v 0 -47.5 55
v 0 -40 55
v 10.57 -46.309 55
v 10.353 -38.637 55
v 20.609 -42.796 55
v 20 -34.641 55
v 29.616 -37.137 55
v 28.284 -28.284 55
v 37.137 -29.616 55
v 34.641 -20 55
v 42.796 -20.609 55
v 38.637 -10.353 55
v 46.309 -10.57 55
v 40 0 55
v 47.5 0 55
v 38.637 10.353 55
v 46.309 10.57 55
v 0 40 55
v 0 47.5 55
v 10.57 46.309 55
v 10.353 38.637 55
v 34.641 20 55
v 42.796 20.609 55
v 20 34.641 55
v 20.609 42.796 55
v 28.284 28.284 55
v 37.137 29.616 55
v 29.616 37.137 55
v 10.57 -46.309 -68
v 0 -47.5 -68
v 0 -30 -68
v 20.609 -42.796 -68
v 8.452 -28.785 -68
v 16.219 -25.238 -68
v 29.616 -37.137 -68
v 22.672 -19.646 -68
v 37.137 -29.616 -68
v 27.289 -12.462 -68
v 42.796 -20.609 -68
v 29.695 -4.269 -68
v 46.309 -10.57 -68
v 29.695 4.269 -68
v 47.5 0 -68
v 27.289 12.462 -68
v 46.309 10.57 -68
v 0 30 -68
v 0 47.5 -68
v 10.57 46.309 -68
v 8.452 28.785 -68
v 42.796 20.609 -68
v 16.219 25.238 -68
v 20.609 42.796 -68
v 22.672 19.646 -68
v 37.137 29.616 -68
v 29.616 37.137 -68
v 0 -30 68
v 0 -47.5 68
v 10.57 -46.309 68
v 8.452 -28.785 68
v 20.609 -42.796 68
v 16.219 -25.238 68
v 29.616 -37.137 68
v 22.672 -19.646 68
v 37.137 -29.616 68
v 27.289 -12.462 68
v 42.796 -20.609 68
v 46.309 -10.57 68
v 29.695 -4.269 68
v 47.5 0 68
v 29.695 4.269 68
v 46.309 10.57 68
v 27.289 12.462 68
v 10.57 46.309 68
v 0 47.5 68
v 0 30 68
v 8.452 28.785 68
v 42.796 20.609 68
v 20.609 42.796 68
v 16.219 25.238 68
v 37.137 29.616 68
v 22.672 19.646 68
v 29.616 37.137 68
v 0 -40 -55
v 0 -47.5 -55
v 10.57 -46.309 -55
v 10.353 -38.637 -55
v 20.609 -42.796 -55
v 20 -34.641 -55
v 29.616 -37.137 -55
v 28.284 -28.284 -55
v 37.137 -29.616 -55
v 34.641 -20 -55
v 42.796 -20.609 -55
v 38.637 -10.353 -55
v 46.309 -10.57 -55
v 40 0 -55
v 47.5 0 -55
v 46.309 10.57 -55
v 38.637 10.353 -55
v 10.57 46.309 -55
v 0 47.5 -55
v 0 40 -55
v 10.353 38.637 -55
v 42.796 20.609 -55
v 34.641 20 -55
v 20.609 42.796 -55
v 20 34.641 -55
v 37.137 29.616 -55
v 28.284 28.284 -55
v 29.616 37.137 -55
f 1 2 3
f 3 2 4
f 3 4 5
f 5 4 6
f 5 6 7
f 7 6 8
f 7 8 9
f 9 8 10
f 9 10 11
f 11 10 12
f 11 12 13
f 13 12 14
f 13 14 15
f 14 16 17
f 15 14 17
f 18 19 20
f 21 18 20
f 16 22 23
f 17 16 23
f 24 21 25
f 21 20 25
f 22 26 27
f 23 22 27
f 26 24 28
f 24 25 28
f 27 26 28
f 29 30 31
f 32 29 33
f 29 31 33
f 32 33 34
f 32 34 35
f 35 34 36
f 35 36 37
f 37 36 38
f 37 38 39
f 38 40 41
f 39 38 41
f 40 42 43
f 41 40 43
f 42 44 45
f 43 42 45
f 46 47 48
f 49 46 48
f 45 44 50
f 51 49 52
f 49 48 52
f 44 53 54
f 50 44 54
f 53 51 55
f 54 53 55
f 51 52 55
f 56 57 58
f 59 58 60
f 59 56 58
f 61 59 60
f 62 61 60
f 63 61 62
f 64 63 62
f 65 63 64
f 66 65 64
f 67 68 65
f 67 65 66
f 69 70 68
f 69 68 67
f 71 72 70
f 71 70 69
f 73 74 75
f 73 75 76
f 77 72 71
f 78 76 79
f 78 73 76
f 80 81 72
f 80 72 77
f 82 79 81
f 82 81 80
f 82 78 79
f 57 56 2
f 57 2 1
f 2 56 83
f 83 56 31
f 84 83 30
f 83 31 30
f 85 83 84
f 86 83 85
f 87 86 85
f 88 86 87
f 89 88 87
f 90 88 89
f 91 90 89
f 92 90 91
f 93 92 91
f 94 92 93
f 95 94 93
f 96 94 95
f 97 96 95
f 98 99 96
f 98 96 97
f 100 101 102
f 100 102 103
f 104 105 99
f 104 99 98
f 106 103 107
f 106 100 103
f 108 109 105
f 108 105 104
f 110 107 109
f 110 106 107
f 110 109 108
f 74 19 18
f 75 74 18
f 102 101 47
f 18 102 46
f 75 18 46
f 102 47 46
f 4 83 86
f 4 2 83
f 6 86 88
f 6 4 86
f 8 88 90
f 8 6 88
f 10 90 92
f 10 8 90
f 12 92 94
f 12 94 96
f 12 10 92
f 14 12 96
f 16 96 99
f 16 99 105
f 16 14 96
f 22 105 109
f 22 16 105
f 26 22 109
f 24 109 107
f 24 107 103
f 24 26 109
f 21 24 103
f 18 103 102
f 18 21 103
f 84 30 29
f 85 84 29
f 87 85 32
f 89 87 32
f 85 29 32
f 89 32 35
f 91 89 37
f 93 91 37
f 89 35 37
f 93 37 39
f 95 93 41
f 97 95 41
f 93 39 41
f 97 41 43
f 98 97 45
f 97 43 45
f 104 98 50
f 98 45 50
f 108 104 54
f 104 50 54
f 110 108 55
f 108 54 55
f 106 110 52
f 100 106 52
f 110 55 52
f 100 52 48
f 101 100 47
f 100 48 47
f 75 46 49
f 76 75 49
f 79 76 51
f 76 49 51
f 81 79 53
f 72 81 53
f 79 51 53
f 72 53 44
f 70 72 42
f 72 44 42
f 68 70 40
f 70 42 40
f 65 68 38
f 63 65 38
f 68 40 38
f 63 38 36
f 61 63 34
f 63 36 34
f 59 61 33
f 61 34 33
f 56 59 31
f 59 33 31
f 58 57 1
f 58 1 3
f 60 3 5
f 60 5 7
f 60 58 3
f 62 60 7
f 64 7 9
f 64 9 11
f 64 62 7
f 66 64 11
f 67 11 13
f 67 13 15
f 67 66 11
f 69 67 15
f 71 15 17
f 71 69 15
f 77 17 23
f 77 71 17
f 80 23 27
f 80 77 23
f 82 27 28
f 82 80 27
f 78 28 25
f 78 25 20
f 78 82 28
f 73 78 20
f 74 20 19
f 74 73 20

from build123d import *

# Parameters (mm, degrees)
BOSS_EXTRUDE1_DEPTH = 55
BOSS_EXTRUDE2_START = 13
BOSS_EXTRUDE2_DEPTH = 13


with BuildPart() as part:
    # Sketch1 → Boss-Extrude1 (new, symmetric)
    with BuildSketch(Plane.XY):
        with BuildLine():
            Line((0, 40), (0, 30))
            ThreePointArc((0, 30), (30, 0), (0, -30))
            Line((0, -30), (0, -40))
            ThreePointArc((0, -40), (40, 0), (0, 40))
        make_face()
    extrude(amount=BOSS_EXTRUDE1_DEPTH, both=True)

    # Sketch2 → Boss-Extrude2 (add)
    with BuildSketch(Plane.XY.offset(55).offset(BOSS_EXTRUDE2_START)):
        with BuildLine():
            Line((0, 47.5), (0, 30))
            ThreePointArc((0, 30), (30, 0), (0, -30))
            Line((0, -30), (0, -47.5))
            ThreePointArc((0, -47.5), (47.5, 0), (0, 47.5))
        make_face()
    boss_extrude2 = extrude(amount=-BOSS_EXTRUDE2_DEPTH)

    # Mirror1: Boss-Extrude2 across plane
    add(boss_extrude2.mirror(Plane.XY))


solid = part.part
